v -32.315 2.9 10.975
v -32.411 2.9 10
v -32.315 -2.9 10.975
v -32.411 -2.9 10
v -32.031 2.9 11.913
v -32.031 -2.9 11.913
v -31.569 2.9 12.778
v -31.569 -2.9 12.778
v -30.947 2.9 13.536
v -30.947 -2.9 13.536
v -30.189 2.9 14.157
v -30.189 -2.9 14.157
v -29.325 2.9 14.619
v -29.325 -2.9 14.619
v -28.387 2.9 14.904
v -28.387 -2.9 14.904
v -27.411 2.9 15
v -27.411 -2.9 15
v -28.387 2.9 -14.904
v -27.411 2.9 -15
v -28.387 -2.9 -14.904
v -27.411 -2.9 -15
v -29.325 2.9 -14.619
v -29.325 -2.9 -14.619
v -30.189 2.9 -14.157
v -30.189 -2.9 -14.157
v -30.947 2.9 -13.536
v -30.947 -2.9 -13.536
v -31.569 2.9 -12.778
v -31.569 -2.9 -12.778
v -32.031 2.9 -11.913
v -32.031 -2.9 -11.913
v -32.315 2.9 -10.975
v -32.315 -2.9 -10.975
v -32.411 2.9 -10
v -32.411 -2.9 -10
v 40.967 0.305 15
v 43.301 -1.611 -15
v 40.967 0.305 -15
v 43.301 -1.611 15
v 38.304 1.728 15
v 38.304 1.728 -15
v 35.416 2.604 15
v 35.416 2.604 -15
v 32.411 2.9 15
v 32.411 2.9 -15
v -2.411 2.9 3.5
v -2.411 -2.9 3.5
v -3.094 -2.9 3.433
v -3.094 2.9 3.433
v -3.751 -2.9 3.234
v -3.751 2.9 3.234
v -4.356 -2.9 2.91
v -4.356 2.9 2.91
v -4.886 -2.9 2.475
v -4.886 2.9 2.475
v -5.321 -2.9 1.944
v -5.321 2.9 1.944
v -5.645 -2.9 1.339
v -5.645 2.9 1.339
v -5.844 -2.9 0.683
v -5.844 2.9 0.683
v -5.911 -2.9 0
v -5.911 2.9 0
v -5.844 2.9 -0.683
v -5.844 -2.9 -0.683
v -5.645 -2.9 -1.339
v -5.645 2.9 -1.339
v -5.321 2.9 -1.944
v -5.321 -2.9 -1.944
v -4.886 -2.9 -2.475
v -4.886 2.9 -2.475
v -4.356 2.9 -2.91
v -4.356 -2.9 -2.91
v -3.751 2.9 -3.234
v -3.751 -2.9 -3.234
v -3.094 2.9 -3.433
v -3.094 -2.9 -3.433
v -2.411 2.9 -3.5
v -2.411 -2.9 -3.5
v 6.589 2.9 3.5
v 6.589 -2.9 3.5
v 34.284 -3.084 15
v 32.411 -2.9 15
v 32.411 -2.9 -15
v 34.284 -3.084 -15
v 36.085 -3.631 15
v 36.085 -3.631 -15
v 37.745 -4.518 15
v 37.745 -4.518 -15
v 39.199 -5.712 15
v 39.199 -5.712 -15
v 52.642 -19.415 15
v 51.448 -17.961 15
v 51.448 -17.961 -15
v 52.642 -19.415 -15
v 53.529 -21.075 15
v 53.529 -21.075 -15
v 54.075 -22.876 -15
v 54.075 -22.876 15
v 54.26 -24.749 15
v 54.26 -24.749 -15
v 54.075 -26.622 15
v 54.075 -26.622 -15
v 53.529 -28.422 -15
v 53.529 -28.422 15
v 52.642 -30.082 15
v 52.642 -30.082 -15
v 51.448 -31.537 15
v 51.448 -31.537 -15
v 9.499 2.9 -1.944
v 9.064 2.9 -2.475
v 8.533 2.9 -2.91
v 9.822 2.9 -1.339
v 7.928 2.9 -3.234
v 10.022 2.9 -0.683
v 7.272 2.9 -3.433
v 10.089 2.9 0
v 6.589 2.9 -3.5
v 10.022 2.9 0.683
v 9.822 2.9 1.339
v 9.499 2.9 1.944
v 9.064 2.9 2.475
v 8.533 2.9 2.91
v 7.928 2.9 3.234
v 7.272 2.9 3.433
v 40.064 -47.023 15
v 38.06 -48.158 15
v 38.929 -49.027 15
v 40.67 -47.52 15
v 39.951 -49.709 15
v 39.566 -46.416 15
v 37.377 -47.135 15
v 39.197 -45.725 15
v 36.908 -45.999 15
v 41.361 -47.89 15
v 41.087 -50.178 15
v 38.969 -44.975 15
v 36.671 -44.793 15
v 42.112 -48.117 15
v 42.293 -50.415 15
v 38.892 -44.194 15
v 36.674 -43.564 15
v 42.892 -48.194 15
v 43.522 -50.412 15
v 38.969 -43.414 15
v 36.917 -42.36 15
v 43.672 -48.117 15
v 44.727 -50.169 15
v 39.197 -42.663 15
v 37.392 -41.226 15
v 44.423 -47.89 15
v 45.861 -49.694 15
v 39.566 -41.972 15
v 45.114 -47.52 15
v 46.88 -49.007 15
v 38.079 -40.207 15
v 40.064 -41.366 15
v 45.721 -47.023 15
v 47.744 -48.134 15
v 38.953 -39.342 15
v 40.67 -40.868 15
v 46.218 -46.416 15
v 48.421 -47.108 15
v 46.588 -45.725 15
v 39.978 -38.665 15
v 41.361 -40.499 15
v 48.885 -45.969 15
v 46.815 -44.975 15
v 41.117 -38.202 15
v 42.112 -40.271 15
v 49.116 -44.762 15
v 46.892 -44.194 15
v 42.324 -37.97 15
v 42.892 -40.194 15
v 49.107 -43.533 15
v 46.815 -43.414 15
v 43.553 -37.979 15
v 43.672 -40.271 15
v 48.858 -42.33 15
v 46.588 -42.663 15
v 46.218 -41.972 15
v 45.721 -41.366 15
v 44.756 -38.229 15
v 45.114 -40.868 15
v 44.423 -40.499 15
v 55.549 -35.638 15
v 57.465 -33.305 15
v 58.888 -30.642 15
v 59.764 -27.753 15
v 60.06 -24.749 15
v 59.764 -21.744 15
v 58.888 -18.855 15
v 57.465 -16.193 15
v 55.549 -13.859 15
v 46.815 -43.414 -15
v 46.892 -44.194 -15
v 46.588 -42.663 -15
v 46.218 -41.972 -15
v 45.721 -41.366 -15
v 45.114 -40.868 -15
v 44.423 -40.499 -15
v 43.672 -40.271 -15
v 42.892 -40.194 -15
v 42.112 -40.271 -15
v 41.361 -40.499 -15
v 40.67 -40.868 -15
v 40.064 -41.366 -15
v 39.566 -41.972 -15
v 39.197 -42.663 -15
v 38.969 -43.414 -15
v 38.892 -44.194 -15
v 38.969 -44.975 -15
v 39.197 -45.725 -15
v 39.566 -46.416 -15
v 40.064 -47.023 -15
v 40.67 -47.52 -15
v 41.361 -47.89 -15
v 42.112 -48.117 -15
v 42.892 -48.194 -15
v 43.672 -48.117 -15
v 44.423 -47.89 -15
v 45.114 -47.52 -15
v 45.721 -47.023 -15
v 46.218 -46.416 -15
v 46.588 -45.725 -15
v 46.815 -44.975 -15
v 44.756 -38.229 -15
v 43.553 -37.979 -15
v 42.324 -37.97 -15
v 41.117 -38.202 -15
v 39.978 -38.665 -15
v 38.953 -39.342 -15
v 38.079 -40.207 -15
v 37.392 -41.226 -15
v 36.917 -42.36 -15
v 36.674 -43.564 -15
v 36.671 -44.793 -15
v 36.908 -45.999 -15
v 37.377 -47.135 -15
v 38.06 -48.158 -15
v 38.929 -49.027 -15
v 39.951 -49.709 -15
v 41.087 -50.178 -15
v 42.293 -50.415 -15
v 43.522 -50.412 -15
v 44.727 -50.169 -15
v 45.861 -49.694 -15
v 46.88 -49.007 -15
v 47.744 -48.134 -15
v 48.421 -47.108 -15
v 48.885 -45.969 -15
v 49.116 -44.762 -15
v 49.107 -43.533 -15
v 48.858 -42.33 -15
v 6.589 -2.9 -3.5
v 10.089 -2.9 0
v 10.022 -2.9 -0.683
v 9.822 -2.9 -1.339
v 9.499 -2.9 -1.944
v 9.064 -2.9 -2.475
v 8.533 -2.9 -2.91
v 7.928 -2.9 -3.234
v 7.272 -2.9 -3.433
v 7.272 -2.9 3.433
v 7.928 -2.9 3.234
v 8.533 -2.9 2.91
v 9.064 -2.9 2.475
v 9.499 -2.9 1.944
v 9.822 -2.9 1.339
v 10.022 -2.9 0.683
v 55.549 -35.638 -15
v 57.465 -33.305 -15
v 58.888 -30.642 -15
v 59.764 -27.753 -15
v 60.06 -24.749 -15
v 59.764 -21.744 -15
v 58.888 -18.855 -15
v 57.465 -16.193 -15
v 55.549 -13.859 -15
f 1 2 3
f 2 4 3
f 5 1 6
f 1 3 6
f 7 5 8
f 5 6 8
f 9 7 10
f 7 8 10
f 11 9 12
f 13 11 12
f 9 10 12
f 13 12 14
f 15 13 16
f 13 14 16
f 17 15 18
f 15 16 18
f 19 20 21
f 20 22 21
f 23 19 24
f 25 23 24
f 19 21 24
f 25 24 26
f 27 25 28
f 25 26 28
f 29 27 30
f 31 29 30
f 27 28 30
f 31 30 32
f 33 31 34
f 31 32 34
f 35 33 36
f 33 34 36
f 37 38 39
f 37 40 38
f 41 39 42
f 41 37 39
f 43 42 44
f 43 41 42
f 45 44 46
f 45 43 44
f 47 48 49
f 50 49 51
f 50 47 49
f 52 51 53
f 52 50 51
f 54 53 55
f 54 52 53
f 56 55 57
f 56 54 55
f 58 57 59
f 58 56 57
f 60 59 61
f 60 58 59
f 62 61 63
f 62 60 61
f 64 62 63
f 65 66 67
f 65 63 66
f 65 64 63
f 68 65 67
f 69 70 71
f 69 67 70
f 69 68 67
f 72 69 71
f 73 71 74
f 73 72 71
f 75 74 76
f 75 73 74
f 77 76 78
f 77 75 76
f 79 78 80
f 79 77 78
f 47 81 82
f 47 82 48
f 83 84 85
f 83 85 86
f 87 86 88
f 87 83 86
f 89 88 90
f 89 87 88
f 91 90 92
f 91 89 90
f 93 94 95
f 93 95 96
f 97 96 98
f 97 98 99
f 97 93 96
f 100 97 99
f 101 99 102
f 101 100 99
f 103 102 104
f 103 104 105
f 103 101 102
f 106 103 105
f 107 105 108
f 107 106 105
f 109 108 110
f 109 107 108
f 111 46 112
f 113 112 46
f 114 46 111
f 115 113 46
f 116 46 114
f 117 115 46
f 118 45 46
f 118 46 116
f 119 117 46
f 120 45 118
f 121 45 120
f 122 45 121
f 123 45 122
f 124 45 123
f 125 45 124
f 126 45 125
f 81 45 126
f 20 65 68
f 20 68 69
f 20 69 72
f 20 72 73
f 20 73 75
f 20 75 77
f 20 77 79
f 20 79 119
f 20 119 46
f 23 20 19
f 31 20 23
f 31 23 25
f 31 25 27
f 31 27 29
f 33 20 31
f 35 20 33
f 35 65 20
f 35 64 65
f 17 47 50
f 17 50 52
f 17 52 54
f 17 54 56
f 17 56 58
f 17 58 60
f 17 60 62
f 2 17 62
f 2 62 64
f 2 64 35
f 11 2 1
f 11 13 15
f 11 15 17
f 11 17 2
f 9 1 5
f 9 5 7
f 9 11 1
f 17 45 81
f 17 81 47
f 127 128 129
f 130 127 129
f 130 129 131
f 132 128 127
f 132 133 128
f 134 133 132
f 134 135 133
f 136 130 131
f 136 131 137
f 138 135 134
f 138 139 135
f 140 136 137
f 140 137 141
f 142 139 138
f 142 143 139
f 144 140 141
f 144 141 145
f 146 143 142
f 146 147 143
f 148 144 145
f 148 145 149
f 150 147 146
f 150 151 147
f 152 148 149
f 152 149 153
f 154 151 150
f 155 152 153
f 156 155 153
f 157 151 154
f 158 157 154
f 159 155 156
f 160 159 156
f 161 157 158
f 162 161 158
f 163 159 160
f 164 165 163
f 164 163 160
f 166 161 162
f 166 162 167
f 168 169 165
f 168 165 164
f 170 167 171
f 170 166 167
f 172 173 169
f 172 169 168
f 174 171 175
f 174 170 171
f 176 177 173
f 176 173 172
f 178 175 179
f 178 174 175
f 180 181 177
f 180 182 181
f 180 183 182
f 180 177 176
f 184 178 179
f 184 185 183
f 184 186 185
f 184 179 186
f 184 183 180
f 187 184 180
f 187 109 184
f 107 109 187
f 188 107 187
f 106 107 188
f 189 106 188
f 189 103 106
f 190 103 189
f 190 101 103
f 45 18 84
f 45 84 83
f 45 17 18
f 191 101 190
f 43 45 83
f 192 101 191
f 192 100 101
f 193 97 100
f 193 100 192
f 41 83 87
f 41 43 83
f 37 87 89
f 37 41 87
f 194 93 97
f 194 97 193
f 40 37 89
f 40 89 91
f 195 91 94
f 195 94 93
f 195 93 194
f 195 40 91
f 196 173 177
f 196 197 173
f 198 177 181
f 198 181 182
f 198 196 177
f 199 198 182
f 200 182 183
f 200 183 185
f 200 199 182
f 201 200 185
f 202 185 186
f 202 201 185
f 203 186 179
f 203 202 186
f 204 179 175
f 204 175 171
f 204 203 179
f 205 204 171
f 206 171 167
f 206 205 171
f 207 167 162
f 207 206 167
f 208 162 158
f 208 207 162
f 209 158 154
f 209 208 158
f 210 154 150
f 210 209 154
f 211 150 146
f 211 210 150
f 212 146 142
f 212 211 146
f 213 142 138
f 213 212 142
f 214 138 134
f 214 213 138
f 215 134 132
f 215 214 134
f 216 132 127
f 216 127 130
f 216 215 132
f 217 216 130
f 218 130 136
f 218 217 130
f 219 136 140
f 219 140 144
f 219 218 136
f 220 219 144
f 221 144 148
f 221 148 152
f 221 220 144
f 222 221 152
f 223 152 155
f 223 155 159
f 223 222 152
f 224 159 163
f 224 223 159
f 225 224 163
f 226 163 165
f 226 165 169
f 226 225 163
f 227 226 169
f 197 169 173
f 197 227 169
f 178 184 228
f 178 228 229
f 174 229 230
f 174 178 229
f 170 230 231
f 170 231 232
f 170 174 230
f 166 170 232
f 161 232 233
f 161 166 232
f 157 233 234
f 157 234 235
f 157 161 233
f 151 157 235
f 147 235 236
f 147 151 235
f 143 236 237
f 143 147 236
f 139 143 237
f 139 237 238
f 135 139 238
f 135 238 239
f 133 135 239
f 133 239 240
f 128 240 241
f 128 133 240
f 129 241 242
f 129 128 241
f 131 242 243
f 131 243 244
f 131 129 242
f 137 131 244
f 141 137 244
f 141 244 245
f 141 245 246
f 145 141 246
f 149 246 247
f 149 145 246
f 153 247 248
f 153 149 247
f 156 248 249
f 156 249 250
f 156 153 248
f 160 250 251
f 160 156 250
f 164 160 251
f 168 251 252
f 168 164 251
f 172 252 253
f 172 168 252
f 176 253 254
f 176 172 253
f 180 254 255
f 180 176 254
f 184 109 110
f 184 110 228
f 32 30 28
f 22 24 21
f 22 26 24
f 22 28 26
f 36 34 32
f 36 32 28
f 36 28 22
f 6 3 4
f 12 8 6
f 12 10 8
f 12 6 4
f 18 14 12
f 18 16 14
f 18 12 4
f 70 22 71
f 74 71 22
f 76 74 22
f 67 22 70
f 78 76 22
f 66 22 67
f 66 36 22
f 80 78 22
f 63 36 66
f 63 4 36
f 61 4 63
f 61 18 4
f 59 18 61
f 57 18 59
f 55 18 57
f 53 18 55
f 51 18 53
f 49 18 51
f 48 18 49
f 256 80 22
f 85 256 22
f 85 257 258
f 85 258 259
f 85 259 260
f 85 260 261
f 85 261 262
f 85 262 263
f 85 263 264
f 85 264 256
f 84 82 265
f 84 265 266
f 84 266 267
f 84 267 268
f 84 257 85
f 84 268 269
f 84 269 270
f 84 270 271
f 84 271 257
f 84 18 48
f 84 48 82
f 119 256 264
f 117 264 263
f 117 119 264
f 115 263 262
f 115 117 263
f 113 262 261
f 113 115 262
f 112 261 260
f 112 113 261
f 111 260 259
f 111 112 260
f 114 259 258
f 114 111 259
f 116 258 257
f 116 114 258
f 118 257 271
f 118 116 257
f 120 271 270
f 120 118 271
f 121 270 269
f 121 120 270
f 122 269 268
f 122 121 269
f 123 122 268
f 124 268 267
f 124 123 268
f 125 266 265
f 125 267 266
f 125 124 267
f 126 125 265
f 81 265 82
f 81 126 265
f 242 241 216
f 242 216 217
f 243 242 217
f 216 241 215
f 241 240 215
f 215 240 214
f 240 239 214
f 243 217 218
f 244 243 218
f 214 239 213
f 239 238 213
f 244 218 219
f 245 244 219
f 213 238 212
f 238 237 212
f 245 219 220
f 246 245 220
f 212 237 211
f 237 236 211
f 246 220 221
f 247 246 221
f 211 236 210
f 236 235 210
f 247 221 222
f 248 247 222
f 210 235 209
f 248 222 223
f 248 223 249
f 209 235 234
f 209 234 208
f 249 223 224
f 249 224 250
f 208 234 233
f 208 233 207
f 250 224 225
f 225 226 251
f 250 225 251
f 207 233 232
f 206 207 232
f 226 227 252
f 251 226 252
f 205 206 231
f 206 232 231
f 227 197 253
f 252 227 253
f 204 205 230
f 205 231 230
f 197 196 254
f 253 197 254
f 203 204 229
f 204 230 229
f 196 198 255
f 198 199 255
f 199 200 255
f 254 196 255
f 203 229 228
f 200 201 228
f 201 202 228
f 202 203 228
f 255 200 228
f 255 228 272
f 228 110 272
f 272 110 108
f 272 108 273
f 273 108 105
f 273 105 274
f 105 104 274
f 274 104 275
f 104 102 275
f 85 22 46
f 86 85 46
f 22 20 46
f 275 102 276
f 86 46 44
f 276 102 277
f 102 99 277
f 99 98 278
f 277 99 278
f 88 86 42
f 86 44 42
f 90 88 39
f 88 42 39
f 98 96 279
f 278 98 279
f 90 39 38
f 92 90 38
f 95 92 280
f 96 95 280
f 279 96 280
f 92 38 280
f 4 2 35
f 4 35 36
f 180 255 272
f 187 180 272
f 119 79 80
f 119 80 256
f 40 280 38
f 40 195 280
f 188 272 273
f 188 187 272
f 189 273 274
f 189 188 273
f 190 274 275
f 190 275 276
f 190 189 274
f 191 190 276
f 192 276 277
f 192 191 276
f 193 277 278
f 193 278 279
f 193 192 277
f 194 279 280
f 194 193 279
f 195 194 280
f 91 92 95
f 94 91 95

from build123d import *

# Parameters (mm, degrees)
SKETCH1_R           = 4
BOSS_EXTRUDE1_DEPTH = 15
CUT_EXTRUDE1_REACH  = 83.718
FILLET1_R           = 5


with BuildPart() as part:
    # Sketch1 → Boss-Extrude1 (new, symmetric)
    with BuildSketch(Plane.XY):
        with BuildLine():
            Line((-32.411165235, -2.9), (32.411165235, -2.9))
            ThreePointArc((32.411165235, -2.9), (36.084926186, -3.630756488), (39.199390335, -5.711774901))
            Line((39.199390335, -5.711774901), (51.448127676, -17.960512242))
            ThreePointArc((51.448127676, -17.960512242), (54.259902577, -24.748737342), (51.448127676, -31.536962441))
            Line((51.448127676, -31.536962441), (44.756401435, -38.228688682))
            ThreePointArc((44.756401435, -38.228688682), (38.472718241, -48.613591207), (48.857620766, -42.329908013))
            Line((48.857620766, -42.329908013), (55.549347007, -35.638181772))
            ThreePointArc((55.549347007, -35.638181772), (60.059902577, -24.748737342), (55.549347007, -13.859292911))
            Line((55.549347007, -13.859292911), (43.300609665, -1.61055557))
            ThreePointArc((43.300609665, -1.61055557), (38.304490094, 1.727744801), (32.411165235, 2.9))
            Line((32.411165235, 2.9), (-32.411165235, 2.9))
            Line((-32.411165235, 2.9), (-32.411165235, -2.9))
        make_face()
        with Locations((42.892135624, -44.194173824)):
            Circle(SKETCH1_R, mode=Mode.SUBTRACT)
    extrude(amount=BOSS_EXTRUDE1_DEPTH, both=True)

    # Sketch2 → Cut-Extrude1 (cut, up to next)
    with BuildSketch(Plane(origin=(0, 2.9, 0), x_dir=(1, 0, 0), z_dir=(0, 1, 0)), mode=Mode.PRIVATE) as cut_extrude1_sk1:
        with BuildLine():
            Line((-2.411165235, 3.5), (6.588834765, 3.5))
            ThreePointArc((6.588834765, 3.5), (10.088834765, 0), (6.588834765, -3.5))
            Line((6.588834765, -3.5), (-2.411165235, -3.5))
            ThreePointArc((-2.411165235, -3.5), (-5.911165235, 0), (-2.411165235, 3.5))
        make_face()
    cut_extrude1_tool1 = extrude(cut_extrude1_sk1.sketch, amount=-CUT_EXTRUDE1_REACH, mode=Mode.PRIVATE) & part.part
    add(cut_extrude1_tool1.solids().sort_by_distance((2.088835, 2.9, 0))[0], mode=Mode.SUBTRACT)

    # Fillet1
    fillet1_edges = [part.edges().sort_by_distance(p)[0] for p in [
        (-32.411165235, 0, -15),
        (-32.411165235, 0, 15),
    ]]
    fillet(fillet1_edges, radius=FILLET1_R)


solid = part.part
